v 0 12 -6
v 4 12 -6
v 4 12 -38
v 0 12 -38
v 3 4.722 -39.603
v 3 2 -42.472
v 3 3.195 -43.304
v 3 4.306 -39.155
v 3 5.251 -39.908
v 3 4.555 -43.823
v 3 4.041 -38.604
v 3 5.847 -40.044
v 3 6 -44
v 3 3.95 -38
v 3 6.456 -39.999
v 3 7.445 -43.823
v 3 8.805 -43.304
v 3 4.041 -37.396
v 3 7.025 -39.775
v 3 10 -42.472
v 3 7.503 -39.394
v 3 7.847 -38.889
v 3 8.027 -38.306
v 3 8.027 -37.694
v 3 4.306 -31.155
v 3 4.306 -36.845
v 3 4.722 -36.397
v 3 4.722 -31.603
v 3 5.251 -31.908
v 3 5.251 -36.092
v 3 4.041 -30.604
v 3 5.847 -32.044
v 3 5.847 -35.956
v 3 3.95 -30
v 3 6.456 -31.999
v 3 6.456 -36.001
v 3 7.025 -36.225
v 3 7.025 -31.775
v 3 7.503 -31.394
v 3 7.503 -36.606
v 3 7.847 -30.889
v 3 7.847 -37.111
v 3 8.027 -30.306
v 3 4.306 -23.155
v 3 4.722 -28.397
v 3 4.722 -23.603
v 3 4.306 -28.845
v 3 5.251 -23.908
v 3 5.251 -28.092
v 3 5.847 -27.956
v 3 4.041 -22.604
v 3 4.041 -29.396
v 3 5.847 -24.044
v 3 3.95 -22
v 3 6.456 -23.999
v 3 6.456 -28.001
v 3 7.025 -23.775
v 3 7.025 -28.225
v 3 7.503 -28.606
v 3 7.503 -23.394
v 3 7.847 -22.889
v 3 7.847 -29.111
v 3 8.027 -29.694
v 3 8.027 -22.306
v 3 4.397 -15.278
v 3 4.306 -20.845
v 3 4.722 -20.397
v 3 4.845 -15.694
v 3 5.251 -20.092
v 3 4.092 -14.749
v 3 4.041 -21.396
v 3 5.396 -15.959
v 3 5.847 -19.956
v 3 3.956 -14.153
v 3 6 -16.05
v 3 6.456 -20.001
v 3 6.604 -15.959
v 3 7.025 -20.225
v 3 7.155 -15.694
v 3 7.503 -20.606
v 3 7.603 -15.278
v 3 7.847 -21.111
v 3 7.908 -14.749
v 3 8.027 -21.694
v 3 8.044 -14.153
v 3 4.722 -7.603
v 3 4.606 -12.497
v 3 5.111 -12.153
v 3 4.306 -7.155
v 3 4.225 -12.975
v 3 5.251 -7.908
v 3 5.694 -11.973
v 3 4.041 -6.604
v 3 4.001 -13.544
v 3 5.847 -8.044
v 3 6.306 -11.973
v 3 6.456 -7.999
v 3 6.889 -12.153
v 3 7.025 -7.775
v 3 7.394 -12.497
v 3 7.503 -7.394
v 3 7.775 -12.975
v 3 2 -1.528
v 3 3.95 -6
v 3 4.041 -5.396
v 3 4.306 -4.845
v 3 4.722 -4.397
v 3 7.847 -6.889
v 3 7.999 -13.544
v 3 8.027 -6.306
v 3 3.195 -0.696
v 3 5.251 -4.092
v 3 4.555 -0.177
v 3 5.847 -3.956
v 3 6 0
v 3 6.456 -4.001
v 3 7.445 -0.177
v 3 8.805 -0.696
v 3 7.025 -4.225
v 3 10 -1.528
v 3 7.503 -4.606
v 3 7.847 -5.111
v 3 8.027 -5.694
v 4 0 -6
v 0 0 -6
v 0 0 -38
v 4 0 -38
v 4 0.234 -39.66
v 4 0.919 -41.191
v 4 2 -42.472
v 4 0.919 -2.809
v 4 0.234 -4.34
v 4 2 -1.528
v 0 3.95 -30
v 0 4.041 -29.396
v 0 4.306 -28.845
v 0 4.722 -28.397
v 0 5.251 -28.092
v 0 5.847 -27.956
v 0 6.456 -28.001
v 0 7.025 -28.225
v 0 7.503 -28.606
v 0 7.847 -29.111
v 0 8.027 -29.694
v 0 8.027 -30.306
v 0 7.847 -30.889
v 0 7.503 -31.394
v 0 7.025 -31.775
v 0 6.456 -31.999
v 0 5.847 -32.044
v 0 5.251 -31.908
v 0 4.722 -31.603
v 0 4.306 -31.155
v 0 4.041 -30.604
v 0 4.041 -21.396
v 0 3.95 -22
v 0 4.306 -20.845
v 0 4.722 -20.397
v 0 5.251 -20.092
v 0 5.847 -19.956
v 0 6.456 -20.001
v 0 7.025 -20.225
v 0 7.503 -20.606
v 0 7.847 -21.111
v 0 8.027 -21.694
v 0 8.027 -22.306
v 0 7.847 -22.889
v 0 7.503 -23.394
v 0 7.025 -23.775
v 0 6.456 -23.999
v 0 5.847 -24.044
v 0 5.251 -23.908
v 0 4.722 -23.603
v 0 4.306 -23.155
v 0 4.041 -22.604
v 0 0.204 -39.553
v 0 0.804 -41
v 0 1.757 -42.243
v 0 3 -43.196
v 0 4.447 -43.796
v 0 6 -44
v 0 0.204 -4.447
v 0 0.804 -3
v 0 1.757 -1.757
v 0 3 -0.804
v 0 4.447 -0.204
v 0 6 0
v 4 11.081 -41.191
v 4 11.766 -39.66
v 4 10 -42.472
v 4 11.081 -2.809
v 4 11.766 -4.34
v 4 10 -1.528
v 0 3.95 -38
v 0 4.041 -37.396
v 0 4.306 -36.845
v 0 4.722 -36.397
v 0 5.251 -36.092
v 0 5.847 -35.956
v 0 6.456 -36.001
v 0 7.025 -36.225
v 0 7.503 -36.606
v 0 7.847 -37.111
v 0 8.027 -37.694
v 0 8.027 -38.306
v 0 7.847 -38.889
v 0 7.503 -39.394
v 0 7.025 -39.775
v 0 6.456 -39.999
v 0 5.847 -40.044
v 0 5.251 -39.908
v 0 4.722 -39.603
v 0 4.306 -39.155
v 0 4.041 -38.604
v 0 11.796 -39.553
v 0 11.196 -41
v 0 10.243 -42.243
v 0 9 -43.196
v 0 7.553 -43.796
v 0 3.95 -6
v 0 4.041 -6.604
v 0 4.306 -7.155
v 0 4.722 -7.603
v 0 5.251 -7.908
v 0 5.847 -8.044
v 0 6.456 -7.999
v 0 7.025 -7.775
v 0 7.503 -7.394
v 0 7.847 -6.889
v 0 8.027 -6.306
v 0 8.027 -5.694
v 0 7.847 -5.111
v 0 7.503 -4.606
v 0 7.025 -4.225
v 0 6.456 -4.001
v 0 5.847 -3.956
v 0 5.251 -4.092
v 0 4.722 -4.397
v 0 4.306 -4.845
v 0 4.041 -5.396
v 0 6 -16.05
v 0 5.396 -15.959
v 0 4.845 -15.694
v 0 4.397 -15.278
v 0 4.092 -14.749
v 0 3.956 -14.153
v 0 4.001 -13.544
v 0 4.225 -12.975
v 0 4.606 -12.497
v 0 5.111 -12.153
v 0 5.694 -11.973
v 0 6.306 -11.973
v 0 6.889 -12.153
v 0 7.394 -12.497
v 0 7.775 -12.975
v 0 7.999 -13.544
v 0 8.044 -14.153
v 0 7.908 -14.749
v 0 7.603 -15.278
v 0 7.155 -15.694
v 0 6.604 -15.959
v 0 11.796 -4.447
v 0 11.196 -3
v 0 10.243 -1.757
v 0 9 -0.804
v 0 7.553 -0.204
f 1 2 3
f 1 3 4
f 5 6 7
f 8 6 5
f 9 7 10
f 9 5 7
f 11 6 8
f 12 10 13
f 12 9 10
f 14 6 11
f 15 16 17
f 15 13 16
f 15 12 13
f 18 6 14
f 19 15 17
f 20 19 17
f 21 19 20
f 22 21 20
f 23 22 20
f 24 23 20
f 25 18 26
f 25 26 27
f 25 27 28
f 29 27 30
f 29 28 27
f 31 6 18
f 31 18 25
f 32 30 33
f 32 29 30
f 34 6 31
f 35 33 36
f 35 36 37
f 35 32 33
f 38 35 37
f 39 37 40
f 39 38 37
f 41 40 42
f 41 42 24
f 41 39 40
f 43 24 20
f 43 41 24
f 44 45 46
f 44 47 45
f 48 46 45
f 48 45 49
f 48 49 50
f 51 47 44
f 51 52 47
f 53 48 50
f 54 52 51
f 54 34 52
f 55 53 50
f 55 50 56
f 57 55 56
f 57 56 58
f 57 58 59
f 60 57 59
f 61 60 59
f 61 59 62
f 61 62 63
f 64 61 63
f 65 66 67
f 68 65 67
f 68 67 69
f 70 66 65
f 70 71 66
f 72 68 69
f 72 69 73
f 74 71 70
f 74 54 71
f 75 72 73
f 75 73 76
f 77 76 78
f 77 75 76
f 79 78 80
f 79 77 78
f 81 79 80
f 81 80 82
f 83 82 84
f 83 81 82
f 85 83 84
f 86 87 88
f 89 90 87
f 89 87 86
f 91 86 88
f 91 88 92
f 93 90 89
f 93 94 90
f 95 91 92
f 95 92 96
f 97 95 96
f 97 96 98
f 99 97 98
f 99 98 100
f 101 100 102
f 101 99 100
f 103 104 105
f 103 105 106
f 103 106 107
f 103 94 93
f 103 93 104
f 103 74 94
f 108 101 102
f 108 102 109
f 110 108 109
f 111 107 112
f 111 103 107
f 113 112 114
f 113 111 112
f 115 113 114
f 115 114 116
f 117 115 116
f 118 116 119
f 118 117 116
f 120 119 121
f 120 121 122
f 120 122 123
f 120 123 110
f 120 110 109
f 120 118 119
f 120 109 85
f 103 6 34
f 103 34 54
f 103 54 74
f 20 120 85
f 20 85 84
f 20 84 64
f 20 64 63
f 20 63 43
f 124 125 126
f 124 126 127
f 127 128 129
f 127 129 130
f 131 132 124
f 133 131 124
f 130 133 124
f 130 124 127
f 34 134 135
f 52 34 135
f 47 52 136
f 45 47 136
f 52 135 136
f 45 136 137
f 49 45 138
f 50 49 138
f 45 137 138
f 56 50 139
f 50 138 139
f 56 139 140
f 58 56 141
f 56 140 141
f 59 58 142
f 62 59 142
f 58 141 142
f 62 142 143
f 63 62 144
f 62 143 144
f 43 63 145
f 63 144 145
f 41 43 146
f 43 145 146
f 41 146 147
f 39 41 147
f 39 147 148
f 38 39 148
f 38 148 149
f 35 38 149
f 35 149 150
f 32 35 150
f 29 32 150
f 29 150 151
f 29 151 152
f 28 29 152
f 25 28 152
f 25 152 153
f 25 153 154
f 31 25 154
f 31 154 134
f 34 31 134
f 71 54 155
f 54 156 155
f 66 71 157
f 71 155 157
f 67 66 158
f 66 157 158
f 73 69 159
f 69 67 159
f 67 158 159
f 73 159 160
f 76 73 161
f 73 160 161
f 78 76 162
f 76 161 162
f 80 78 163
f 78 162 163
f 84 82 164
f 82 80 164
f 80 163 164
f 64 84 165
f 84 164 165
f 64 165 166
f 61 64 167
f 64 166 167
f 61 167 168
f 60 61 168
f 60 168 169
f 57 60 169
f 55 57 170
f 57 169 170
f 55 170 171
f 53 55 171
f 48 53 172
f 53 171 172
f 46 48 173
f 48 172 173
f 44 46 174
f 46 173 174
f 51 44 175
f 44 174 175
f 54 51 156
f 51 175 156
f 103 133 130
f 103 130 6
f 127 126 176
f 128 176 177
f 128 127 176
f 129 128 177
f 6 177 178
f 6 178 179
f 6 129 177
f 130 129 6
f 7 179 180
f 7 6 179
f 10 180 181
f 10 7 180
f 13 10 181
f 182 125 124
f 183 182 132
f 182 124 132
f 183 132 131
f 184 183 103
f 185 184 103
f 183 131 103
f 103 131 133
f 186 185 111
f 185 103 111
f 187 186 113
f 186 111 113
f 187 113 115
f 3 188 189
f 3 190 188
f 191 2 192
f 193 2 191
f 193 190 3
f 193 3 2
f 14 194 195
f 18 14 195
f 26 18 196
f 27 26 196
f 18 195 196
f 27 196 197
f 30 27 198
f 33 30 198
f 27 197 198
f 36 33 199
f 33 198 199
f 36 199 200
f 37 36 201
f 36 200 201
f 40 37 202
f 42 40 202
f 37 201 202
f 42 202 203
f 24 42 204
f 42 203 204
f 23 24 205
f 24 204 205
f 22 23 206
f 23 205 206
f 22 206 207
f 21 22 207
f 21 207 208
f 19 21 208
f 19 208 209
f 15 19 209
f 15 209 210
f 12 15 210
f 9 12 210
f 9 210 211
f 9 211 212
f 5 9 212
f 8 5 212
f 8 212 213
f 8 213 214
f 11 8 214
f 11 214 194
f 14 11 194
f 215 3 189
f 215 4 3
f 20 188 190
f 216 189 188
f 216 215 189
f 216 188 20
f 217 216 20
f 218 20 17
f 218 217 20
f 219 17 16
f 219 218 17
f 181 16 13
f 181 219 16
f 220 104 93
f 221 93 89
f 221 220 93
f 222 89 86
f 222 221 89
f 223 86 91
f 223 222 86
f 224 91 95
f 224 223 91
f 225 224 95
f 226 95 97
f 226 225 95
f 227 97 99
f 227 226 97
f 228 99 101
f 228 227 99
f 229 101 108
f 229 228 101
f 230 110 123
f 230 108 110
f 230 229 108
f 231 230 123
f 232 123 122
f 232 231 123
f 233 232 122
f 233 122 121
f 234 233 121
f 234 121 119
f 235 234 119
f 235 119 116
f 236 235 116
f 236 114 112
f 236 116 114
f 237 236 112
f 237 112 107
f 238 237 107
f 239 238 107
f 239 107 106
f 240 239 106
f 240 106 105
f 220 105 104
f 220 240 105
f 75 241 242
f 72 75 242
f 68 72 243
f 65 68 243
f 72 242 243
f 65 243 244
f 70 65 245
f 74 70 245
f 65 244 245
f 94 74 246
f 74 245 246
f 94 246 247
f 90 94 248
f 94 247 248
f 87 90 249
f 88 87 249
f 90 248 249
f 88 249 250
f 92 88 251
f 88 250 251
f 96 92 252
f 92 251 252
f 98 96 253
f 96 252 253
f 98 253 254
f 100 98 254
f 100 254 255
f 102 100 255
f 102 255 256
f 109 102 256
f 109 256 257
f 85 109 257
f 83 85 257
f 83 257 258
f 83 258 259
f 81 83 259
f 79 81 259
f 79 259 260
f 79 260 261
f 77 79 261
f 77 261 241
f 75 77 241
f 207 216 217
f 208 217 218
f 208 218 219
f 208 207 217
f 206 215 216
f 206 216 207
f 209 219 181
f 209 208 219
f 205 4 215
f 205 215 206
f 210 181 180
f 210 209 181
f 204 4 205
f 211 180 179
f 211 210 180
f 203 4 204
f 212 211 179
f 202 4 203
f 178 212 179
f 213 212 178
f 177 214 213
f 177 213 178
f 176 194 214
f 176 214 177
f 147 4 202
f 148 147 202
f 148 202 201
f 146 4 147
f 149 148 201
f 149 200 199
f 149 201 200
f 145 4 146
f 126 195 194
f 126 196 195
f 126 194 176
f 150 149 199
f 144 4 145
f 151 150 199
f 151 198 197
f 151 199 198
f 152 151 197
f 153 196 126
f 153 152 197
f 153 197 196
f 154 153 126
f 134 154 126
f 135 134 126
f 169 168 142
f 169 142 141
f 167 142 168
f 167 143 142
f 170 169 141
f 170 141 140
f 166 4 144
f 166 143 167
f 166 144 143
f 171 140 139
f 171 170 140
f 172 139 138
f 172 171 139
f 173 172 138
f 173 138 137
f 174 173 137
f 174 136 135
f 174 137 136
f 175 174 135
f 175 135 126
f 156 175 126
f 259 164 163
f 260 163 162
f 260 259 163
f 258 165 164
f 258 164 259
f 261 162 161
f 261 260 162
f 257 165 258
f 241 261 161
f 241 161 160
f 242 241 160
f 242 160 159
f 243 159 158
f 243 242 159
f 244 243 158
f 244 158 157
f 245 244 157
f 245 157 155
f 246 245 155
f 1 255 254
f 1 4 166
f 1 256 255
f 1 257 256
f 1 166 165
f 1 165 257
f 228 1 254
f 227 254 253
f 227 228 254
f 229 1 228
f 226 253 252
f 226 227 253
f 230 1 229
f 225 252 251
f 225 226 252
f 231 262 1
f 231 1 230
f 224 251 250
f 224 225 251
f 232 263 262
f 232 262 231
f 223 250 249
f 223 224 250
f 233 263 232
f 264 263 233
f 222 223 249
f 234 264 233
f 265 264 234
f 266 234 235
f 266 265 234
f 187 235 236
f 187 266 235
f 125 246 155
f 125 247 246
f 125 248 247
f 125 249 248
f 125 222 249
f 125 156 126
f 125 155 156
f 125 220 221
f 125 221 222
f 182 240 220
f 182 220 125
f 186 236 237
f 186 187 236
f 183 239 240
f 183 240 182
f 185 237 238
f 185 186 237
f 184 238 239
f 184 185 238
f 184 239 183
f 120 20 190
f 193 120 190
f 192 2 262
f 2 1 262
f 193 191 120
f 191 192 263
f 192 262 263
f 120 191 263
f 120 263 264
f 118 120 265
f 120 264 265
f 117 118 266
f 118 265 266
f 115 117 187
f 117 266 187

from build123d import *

# Parameters (mm, degrees)
BOSS_EXTRUDE1_DEPTH     = 44
FILLET1_R               = 6
SKETCH2_R               = 2.05
CUT_EXTRUDE1_DEPTH      = 46.782092569
LPATTERN1_COUNT         = 3
LPATTERN1_PITCH         = 8
MIRROR1_COPY_1_SKETCH_R = 2.05
MIRROR1_COPY_1_DEPTH    = 46.782092569
MIRROR1_COPY_2_SKETCH_R = 2.05
MIRROR1_COPY_2_DEPTH    = 46.782092569


with BuildPart() as part:
    # Sketch1 → Boss-Extrude1 (new body)
    with BuildSketch(Plane.XY):
        Polygon((0, 0), (4, 0), (4, 2), (3, 2), (3, 10), (4, 10), (4, 12), (0, 12), align=None)
    extrude(amount=-BOSS_EXTRUDE1_DEPTH)

    # Fillet1
    fillet1_edges = [part.edges().sort_by_distance(p)[0] for p in [
        (2, 12, 0),
        (2, 0, 0),
        (2, 0, -44),
        (2, 12, -44),
    ]]
    fillet(fillet1_edges, radius=FILLET1_R - 0.0001)  # a hair under: the kernel refuses the full size

    # Sketch2 → Cut-Extrude1 (cut, through all)
    with BuildSketch(Plane.ZY):
        with Locations(Location((-38, 6, 0), (0, 0, 270))):
            Circle(SKETCH2_R)
    cut_extrude1 = extrude(amount=-CUT_EXTRUDE1_DEPTH, mode=Mode.SUBTRACT)

    # LPattern1: Cut-Extrude1 ×3
    with Locations(*[(0, 0, i * LPATTERN1_PITCH) for i in range(1, LPATTERN1_COUNT)]):
        add(cut_extrude1, mode=Mode.SUBTRACT)

    # Mirror1: Cut-Extrude1 across plane
    add(cut_extrude1.mirror(Plane.XY.offset(-22)), mode=Mode.SUBTRACT)

    # Mirror1 copy 1 sketch → Mirror1 copy 1 (cut, through all)
    with BuildSketch(Plane(origin=(0, 0, -52), x_dir=(0, 0, -1), z_dir=(-1, 0, 0))):
        with Locations((-38, -6)):
            Circle(MIRROR1_COPY_1_SKETCH_R)
    extrude(amount=-MIRROR1_COPY_1_DEPTH, mode=Mode.SUBTRACT)

    # Mirror1 copy 2 sketch → Mirror1 copy 2 (cut, through all)
    with BuildSketch(Plane(origin=(0, 0, -60), x_dir=(0, 0, -1), z_dir=(-1, 0, 0))):
        with Locations((-38, -6)):
            Circle(MIRROR1_COPY_2_SKETCH_R)
    extrude(amount=-MIRROR1_COPY_2_DEPTH, mode=Mode.SUBTRACT)


solid = part.part
